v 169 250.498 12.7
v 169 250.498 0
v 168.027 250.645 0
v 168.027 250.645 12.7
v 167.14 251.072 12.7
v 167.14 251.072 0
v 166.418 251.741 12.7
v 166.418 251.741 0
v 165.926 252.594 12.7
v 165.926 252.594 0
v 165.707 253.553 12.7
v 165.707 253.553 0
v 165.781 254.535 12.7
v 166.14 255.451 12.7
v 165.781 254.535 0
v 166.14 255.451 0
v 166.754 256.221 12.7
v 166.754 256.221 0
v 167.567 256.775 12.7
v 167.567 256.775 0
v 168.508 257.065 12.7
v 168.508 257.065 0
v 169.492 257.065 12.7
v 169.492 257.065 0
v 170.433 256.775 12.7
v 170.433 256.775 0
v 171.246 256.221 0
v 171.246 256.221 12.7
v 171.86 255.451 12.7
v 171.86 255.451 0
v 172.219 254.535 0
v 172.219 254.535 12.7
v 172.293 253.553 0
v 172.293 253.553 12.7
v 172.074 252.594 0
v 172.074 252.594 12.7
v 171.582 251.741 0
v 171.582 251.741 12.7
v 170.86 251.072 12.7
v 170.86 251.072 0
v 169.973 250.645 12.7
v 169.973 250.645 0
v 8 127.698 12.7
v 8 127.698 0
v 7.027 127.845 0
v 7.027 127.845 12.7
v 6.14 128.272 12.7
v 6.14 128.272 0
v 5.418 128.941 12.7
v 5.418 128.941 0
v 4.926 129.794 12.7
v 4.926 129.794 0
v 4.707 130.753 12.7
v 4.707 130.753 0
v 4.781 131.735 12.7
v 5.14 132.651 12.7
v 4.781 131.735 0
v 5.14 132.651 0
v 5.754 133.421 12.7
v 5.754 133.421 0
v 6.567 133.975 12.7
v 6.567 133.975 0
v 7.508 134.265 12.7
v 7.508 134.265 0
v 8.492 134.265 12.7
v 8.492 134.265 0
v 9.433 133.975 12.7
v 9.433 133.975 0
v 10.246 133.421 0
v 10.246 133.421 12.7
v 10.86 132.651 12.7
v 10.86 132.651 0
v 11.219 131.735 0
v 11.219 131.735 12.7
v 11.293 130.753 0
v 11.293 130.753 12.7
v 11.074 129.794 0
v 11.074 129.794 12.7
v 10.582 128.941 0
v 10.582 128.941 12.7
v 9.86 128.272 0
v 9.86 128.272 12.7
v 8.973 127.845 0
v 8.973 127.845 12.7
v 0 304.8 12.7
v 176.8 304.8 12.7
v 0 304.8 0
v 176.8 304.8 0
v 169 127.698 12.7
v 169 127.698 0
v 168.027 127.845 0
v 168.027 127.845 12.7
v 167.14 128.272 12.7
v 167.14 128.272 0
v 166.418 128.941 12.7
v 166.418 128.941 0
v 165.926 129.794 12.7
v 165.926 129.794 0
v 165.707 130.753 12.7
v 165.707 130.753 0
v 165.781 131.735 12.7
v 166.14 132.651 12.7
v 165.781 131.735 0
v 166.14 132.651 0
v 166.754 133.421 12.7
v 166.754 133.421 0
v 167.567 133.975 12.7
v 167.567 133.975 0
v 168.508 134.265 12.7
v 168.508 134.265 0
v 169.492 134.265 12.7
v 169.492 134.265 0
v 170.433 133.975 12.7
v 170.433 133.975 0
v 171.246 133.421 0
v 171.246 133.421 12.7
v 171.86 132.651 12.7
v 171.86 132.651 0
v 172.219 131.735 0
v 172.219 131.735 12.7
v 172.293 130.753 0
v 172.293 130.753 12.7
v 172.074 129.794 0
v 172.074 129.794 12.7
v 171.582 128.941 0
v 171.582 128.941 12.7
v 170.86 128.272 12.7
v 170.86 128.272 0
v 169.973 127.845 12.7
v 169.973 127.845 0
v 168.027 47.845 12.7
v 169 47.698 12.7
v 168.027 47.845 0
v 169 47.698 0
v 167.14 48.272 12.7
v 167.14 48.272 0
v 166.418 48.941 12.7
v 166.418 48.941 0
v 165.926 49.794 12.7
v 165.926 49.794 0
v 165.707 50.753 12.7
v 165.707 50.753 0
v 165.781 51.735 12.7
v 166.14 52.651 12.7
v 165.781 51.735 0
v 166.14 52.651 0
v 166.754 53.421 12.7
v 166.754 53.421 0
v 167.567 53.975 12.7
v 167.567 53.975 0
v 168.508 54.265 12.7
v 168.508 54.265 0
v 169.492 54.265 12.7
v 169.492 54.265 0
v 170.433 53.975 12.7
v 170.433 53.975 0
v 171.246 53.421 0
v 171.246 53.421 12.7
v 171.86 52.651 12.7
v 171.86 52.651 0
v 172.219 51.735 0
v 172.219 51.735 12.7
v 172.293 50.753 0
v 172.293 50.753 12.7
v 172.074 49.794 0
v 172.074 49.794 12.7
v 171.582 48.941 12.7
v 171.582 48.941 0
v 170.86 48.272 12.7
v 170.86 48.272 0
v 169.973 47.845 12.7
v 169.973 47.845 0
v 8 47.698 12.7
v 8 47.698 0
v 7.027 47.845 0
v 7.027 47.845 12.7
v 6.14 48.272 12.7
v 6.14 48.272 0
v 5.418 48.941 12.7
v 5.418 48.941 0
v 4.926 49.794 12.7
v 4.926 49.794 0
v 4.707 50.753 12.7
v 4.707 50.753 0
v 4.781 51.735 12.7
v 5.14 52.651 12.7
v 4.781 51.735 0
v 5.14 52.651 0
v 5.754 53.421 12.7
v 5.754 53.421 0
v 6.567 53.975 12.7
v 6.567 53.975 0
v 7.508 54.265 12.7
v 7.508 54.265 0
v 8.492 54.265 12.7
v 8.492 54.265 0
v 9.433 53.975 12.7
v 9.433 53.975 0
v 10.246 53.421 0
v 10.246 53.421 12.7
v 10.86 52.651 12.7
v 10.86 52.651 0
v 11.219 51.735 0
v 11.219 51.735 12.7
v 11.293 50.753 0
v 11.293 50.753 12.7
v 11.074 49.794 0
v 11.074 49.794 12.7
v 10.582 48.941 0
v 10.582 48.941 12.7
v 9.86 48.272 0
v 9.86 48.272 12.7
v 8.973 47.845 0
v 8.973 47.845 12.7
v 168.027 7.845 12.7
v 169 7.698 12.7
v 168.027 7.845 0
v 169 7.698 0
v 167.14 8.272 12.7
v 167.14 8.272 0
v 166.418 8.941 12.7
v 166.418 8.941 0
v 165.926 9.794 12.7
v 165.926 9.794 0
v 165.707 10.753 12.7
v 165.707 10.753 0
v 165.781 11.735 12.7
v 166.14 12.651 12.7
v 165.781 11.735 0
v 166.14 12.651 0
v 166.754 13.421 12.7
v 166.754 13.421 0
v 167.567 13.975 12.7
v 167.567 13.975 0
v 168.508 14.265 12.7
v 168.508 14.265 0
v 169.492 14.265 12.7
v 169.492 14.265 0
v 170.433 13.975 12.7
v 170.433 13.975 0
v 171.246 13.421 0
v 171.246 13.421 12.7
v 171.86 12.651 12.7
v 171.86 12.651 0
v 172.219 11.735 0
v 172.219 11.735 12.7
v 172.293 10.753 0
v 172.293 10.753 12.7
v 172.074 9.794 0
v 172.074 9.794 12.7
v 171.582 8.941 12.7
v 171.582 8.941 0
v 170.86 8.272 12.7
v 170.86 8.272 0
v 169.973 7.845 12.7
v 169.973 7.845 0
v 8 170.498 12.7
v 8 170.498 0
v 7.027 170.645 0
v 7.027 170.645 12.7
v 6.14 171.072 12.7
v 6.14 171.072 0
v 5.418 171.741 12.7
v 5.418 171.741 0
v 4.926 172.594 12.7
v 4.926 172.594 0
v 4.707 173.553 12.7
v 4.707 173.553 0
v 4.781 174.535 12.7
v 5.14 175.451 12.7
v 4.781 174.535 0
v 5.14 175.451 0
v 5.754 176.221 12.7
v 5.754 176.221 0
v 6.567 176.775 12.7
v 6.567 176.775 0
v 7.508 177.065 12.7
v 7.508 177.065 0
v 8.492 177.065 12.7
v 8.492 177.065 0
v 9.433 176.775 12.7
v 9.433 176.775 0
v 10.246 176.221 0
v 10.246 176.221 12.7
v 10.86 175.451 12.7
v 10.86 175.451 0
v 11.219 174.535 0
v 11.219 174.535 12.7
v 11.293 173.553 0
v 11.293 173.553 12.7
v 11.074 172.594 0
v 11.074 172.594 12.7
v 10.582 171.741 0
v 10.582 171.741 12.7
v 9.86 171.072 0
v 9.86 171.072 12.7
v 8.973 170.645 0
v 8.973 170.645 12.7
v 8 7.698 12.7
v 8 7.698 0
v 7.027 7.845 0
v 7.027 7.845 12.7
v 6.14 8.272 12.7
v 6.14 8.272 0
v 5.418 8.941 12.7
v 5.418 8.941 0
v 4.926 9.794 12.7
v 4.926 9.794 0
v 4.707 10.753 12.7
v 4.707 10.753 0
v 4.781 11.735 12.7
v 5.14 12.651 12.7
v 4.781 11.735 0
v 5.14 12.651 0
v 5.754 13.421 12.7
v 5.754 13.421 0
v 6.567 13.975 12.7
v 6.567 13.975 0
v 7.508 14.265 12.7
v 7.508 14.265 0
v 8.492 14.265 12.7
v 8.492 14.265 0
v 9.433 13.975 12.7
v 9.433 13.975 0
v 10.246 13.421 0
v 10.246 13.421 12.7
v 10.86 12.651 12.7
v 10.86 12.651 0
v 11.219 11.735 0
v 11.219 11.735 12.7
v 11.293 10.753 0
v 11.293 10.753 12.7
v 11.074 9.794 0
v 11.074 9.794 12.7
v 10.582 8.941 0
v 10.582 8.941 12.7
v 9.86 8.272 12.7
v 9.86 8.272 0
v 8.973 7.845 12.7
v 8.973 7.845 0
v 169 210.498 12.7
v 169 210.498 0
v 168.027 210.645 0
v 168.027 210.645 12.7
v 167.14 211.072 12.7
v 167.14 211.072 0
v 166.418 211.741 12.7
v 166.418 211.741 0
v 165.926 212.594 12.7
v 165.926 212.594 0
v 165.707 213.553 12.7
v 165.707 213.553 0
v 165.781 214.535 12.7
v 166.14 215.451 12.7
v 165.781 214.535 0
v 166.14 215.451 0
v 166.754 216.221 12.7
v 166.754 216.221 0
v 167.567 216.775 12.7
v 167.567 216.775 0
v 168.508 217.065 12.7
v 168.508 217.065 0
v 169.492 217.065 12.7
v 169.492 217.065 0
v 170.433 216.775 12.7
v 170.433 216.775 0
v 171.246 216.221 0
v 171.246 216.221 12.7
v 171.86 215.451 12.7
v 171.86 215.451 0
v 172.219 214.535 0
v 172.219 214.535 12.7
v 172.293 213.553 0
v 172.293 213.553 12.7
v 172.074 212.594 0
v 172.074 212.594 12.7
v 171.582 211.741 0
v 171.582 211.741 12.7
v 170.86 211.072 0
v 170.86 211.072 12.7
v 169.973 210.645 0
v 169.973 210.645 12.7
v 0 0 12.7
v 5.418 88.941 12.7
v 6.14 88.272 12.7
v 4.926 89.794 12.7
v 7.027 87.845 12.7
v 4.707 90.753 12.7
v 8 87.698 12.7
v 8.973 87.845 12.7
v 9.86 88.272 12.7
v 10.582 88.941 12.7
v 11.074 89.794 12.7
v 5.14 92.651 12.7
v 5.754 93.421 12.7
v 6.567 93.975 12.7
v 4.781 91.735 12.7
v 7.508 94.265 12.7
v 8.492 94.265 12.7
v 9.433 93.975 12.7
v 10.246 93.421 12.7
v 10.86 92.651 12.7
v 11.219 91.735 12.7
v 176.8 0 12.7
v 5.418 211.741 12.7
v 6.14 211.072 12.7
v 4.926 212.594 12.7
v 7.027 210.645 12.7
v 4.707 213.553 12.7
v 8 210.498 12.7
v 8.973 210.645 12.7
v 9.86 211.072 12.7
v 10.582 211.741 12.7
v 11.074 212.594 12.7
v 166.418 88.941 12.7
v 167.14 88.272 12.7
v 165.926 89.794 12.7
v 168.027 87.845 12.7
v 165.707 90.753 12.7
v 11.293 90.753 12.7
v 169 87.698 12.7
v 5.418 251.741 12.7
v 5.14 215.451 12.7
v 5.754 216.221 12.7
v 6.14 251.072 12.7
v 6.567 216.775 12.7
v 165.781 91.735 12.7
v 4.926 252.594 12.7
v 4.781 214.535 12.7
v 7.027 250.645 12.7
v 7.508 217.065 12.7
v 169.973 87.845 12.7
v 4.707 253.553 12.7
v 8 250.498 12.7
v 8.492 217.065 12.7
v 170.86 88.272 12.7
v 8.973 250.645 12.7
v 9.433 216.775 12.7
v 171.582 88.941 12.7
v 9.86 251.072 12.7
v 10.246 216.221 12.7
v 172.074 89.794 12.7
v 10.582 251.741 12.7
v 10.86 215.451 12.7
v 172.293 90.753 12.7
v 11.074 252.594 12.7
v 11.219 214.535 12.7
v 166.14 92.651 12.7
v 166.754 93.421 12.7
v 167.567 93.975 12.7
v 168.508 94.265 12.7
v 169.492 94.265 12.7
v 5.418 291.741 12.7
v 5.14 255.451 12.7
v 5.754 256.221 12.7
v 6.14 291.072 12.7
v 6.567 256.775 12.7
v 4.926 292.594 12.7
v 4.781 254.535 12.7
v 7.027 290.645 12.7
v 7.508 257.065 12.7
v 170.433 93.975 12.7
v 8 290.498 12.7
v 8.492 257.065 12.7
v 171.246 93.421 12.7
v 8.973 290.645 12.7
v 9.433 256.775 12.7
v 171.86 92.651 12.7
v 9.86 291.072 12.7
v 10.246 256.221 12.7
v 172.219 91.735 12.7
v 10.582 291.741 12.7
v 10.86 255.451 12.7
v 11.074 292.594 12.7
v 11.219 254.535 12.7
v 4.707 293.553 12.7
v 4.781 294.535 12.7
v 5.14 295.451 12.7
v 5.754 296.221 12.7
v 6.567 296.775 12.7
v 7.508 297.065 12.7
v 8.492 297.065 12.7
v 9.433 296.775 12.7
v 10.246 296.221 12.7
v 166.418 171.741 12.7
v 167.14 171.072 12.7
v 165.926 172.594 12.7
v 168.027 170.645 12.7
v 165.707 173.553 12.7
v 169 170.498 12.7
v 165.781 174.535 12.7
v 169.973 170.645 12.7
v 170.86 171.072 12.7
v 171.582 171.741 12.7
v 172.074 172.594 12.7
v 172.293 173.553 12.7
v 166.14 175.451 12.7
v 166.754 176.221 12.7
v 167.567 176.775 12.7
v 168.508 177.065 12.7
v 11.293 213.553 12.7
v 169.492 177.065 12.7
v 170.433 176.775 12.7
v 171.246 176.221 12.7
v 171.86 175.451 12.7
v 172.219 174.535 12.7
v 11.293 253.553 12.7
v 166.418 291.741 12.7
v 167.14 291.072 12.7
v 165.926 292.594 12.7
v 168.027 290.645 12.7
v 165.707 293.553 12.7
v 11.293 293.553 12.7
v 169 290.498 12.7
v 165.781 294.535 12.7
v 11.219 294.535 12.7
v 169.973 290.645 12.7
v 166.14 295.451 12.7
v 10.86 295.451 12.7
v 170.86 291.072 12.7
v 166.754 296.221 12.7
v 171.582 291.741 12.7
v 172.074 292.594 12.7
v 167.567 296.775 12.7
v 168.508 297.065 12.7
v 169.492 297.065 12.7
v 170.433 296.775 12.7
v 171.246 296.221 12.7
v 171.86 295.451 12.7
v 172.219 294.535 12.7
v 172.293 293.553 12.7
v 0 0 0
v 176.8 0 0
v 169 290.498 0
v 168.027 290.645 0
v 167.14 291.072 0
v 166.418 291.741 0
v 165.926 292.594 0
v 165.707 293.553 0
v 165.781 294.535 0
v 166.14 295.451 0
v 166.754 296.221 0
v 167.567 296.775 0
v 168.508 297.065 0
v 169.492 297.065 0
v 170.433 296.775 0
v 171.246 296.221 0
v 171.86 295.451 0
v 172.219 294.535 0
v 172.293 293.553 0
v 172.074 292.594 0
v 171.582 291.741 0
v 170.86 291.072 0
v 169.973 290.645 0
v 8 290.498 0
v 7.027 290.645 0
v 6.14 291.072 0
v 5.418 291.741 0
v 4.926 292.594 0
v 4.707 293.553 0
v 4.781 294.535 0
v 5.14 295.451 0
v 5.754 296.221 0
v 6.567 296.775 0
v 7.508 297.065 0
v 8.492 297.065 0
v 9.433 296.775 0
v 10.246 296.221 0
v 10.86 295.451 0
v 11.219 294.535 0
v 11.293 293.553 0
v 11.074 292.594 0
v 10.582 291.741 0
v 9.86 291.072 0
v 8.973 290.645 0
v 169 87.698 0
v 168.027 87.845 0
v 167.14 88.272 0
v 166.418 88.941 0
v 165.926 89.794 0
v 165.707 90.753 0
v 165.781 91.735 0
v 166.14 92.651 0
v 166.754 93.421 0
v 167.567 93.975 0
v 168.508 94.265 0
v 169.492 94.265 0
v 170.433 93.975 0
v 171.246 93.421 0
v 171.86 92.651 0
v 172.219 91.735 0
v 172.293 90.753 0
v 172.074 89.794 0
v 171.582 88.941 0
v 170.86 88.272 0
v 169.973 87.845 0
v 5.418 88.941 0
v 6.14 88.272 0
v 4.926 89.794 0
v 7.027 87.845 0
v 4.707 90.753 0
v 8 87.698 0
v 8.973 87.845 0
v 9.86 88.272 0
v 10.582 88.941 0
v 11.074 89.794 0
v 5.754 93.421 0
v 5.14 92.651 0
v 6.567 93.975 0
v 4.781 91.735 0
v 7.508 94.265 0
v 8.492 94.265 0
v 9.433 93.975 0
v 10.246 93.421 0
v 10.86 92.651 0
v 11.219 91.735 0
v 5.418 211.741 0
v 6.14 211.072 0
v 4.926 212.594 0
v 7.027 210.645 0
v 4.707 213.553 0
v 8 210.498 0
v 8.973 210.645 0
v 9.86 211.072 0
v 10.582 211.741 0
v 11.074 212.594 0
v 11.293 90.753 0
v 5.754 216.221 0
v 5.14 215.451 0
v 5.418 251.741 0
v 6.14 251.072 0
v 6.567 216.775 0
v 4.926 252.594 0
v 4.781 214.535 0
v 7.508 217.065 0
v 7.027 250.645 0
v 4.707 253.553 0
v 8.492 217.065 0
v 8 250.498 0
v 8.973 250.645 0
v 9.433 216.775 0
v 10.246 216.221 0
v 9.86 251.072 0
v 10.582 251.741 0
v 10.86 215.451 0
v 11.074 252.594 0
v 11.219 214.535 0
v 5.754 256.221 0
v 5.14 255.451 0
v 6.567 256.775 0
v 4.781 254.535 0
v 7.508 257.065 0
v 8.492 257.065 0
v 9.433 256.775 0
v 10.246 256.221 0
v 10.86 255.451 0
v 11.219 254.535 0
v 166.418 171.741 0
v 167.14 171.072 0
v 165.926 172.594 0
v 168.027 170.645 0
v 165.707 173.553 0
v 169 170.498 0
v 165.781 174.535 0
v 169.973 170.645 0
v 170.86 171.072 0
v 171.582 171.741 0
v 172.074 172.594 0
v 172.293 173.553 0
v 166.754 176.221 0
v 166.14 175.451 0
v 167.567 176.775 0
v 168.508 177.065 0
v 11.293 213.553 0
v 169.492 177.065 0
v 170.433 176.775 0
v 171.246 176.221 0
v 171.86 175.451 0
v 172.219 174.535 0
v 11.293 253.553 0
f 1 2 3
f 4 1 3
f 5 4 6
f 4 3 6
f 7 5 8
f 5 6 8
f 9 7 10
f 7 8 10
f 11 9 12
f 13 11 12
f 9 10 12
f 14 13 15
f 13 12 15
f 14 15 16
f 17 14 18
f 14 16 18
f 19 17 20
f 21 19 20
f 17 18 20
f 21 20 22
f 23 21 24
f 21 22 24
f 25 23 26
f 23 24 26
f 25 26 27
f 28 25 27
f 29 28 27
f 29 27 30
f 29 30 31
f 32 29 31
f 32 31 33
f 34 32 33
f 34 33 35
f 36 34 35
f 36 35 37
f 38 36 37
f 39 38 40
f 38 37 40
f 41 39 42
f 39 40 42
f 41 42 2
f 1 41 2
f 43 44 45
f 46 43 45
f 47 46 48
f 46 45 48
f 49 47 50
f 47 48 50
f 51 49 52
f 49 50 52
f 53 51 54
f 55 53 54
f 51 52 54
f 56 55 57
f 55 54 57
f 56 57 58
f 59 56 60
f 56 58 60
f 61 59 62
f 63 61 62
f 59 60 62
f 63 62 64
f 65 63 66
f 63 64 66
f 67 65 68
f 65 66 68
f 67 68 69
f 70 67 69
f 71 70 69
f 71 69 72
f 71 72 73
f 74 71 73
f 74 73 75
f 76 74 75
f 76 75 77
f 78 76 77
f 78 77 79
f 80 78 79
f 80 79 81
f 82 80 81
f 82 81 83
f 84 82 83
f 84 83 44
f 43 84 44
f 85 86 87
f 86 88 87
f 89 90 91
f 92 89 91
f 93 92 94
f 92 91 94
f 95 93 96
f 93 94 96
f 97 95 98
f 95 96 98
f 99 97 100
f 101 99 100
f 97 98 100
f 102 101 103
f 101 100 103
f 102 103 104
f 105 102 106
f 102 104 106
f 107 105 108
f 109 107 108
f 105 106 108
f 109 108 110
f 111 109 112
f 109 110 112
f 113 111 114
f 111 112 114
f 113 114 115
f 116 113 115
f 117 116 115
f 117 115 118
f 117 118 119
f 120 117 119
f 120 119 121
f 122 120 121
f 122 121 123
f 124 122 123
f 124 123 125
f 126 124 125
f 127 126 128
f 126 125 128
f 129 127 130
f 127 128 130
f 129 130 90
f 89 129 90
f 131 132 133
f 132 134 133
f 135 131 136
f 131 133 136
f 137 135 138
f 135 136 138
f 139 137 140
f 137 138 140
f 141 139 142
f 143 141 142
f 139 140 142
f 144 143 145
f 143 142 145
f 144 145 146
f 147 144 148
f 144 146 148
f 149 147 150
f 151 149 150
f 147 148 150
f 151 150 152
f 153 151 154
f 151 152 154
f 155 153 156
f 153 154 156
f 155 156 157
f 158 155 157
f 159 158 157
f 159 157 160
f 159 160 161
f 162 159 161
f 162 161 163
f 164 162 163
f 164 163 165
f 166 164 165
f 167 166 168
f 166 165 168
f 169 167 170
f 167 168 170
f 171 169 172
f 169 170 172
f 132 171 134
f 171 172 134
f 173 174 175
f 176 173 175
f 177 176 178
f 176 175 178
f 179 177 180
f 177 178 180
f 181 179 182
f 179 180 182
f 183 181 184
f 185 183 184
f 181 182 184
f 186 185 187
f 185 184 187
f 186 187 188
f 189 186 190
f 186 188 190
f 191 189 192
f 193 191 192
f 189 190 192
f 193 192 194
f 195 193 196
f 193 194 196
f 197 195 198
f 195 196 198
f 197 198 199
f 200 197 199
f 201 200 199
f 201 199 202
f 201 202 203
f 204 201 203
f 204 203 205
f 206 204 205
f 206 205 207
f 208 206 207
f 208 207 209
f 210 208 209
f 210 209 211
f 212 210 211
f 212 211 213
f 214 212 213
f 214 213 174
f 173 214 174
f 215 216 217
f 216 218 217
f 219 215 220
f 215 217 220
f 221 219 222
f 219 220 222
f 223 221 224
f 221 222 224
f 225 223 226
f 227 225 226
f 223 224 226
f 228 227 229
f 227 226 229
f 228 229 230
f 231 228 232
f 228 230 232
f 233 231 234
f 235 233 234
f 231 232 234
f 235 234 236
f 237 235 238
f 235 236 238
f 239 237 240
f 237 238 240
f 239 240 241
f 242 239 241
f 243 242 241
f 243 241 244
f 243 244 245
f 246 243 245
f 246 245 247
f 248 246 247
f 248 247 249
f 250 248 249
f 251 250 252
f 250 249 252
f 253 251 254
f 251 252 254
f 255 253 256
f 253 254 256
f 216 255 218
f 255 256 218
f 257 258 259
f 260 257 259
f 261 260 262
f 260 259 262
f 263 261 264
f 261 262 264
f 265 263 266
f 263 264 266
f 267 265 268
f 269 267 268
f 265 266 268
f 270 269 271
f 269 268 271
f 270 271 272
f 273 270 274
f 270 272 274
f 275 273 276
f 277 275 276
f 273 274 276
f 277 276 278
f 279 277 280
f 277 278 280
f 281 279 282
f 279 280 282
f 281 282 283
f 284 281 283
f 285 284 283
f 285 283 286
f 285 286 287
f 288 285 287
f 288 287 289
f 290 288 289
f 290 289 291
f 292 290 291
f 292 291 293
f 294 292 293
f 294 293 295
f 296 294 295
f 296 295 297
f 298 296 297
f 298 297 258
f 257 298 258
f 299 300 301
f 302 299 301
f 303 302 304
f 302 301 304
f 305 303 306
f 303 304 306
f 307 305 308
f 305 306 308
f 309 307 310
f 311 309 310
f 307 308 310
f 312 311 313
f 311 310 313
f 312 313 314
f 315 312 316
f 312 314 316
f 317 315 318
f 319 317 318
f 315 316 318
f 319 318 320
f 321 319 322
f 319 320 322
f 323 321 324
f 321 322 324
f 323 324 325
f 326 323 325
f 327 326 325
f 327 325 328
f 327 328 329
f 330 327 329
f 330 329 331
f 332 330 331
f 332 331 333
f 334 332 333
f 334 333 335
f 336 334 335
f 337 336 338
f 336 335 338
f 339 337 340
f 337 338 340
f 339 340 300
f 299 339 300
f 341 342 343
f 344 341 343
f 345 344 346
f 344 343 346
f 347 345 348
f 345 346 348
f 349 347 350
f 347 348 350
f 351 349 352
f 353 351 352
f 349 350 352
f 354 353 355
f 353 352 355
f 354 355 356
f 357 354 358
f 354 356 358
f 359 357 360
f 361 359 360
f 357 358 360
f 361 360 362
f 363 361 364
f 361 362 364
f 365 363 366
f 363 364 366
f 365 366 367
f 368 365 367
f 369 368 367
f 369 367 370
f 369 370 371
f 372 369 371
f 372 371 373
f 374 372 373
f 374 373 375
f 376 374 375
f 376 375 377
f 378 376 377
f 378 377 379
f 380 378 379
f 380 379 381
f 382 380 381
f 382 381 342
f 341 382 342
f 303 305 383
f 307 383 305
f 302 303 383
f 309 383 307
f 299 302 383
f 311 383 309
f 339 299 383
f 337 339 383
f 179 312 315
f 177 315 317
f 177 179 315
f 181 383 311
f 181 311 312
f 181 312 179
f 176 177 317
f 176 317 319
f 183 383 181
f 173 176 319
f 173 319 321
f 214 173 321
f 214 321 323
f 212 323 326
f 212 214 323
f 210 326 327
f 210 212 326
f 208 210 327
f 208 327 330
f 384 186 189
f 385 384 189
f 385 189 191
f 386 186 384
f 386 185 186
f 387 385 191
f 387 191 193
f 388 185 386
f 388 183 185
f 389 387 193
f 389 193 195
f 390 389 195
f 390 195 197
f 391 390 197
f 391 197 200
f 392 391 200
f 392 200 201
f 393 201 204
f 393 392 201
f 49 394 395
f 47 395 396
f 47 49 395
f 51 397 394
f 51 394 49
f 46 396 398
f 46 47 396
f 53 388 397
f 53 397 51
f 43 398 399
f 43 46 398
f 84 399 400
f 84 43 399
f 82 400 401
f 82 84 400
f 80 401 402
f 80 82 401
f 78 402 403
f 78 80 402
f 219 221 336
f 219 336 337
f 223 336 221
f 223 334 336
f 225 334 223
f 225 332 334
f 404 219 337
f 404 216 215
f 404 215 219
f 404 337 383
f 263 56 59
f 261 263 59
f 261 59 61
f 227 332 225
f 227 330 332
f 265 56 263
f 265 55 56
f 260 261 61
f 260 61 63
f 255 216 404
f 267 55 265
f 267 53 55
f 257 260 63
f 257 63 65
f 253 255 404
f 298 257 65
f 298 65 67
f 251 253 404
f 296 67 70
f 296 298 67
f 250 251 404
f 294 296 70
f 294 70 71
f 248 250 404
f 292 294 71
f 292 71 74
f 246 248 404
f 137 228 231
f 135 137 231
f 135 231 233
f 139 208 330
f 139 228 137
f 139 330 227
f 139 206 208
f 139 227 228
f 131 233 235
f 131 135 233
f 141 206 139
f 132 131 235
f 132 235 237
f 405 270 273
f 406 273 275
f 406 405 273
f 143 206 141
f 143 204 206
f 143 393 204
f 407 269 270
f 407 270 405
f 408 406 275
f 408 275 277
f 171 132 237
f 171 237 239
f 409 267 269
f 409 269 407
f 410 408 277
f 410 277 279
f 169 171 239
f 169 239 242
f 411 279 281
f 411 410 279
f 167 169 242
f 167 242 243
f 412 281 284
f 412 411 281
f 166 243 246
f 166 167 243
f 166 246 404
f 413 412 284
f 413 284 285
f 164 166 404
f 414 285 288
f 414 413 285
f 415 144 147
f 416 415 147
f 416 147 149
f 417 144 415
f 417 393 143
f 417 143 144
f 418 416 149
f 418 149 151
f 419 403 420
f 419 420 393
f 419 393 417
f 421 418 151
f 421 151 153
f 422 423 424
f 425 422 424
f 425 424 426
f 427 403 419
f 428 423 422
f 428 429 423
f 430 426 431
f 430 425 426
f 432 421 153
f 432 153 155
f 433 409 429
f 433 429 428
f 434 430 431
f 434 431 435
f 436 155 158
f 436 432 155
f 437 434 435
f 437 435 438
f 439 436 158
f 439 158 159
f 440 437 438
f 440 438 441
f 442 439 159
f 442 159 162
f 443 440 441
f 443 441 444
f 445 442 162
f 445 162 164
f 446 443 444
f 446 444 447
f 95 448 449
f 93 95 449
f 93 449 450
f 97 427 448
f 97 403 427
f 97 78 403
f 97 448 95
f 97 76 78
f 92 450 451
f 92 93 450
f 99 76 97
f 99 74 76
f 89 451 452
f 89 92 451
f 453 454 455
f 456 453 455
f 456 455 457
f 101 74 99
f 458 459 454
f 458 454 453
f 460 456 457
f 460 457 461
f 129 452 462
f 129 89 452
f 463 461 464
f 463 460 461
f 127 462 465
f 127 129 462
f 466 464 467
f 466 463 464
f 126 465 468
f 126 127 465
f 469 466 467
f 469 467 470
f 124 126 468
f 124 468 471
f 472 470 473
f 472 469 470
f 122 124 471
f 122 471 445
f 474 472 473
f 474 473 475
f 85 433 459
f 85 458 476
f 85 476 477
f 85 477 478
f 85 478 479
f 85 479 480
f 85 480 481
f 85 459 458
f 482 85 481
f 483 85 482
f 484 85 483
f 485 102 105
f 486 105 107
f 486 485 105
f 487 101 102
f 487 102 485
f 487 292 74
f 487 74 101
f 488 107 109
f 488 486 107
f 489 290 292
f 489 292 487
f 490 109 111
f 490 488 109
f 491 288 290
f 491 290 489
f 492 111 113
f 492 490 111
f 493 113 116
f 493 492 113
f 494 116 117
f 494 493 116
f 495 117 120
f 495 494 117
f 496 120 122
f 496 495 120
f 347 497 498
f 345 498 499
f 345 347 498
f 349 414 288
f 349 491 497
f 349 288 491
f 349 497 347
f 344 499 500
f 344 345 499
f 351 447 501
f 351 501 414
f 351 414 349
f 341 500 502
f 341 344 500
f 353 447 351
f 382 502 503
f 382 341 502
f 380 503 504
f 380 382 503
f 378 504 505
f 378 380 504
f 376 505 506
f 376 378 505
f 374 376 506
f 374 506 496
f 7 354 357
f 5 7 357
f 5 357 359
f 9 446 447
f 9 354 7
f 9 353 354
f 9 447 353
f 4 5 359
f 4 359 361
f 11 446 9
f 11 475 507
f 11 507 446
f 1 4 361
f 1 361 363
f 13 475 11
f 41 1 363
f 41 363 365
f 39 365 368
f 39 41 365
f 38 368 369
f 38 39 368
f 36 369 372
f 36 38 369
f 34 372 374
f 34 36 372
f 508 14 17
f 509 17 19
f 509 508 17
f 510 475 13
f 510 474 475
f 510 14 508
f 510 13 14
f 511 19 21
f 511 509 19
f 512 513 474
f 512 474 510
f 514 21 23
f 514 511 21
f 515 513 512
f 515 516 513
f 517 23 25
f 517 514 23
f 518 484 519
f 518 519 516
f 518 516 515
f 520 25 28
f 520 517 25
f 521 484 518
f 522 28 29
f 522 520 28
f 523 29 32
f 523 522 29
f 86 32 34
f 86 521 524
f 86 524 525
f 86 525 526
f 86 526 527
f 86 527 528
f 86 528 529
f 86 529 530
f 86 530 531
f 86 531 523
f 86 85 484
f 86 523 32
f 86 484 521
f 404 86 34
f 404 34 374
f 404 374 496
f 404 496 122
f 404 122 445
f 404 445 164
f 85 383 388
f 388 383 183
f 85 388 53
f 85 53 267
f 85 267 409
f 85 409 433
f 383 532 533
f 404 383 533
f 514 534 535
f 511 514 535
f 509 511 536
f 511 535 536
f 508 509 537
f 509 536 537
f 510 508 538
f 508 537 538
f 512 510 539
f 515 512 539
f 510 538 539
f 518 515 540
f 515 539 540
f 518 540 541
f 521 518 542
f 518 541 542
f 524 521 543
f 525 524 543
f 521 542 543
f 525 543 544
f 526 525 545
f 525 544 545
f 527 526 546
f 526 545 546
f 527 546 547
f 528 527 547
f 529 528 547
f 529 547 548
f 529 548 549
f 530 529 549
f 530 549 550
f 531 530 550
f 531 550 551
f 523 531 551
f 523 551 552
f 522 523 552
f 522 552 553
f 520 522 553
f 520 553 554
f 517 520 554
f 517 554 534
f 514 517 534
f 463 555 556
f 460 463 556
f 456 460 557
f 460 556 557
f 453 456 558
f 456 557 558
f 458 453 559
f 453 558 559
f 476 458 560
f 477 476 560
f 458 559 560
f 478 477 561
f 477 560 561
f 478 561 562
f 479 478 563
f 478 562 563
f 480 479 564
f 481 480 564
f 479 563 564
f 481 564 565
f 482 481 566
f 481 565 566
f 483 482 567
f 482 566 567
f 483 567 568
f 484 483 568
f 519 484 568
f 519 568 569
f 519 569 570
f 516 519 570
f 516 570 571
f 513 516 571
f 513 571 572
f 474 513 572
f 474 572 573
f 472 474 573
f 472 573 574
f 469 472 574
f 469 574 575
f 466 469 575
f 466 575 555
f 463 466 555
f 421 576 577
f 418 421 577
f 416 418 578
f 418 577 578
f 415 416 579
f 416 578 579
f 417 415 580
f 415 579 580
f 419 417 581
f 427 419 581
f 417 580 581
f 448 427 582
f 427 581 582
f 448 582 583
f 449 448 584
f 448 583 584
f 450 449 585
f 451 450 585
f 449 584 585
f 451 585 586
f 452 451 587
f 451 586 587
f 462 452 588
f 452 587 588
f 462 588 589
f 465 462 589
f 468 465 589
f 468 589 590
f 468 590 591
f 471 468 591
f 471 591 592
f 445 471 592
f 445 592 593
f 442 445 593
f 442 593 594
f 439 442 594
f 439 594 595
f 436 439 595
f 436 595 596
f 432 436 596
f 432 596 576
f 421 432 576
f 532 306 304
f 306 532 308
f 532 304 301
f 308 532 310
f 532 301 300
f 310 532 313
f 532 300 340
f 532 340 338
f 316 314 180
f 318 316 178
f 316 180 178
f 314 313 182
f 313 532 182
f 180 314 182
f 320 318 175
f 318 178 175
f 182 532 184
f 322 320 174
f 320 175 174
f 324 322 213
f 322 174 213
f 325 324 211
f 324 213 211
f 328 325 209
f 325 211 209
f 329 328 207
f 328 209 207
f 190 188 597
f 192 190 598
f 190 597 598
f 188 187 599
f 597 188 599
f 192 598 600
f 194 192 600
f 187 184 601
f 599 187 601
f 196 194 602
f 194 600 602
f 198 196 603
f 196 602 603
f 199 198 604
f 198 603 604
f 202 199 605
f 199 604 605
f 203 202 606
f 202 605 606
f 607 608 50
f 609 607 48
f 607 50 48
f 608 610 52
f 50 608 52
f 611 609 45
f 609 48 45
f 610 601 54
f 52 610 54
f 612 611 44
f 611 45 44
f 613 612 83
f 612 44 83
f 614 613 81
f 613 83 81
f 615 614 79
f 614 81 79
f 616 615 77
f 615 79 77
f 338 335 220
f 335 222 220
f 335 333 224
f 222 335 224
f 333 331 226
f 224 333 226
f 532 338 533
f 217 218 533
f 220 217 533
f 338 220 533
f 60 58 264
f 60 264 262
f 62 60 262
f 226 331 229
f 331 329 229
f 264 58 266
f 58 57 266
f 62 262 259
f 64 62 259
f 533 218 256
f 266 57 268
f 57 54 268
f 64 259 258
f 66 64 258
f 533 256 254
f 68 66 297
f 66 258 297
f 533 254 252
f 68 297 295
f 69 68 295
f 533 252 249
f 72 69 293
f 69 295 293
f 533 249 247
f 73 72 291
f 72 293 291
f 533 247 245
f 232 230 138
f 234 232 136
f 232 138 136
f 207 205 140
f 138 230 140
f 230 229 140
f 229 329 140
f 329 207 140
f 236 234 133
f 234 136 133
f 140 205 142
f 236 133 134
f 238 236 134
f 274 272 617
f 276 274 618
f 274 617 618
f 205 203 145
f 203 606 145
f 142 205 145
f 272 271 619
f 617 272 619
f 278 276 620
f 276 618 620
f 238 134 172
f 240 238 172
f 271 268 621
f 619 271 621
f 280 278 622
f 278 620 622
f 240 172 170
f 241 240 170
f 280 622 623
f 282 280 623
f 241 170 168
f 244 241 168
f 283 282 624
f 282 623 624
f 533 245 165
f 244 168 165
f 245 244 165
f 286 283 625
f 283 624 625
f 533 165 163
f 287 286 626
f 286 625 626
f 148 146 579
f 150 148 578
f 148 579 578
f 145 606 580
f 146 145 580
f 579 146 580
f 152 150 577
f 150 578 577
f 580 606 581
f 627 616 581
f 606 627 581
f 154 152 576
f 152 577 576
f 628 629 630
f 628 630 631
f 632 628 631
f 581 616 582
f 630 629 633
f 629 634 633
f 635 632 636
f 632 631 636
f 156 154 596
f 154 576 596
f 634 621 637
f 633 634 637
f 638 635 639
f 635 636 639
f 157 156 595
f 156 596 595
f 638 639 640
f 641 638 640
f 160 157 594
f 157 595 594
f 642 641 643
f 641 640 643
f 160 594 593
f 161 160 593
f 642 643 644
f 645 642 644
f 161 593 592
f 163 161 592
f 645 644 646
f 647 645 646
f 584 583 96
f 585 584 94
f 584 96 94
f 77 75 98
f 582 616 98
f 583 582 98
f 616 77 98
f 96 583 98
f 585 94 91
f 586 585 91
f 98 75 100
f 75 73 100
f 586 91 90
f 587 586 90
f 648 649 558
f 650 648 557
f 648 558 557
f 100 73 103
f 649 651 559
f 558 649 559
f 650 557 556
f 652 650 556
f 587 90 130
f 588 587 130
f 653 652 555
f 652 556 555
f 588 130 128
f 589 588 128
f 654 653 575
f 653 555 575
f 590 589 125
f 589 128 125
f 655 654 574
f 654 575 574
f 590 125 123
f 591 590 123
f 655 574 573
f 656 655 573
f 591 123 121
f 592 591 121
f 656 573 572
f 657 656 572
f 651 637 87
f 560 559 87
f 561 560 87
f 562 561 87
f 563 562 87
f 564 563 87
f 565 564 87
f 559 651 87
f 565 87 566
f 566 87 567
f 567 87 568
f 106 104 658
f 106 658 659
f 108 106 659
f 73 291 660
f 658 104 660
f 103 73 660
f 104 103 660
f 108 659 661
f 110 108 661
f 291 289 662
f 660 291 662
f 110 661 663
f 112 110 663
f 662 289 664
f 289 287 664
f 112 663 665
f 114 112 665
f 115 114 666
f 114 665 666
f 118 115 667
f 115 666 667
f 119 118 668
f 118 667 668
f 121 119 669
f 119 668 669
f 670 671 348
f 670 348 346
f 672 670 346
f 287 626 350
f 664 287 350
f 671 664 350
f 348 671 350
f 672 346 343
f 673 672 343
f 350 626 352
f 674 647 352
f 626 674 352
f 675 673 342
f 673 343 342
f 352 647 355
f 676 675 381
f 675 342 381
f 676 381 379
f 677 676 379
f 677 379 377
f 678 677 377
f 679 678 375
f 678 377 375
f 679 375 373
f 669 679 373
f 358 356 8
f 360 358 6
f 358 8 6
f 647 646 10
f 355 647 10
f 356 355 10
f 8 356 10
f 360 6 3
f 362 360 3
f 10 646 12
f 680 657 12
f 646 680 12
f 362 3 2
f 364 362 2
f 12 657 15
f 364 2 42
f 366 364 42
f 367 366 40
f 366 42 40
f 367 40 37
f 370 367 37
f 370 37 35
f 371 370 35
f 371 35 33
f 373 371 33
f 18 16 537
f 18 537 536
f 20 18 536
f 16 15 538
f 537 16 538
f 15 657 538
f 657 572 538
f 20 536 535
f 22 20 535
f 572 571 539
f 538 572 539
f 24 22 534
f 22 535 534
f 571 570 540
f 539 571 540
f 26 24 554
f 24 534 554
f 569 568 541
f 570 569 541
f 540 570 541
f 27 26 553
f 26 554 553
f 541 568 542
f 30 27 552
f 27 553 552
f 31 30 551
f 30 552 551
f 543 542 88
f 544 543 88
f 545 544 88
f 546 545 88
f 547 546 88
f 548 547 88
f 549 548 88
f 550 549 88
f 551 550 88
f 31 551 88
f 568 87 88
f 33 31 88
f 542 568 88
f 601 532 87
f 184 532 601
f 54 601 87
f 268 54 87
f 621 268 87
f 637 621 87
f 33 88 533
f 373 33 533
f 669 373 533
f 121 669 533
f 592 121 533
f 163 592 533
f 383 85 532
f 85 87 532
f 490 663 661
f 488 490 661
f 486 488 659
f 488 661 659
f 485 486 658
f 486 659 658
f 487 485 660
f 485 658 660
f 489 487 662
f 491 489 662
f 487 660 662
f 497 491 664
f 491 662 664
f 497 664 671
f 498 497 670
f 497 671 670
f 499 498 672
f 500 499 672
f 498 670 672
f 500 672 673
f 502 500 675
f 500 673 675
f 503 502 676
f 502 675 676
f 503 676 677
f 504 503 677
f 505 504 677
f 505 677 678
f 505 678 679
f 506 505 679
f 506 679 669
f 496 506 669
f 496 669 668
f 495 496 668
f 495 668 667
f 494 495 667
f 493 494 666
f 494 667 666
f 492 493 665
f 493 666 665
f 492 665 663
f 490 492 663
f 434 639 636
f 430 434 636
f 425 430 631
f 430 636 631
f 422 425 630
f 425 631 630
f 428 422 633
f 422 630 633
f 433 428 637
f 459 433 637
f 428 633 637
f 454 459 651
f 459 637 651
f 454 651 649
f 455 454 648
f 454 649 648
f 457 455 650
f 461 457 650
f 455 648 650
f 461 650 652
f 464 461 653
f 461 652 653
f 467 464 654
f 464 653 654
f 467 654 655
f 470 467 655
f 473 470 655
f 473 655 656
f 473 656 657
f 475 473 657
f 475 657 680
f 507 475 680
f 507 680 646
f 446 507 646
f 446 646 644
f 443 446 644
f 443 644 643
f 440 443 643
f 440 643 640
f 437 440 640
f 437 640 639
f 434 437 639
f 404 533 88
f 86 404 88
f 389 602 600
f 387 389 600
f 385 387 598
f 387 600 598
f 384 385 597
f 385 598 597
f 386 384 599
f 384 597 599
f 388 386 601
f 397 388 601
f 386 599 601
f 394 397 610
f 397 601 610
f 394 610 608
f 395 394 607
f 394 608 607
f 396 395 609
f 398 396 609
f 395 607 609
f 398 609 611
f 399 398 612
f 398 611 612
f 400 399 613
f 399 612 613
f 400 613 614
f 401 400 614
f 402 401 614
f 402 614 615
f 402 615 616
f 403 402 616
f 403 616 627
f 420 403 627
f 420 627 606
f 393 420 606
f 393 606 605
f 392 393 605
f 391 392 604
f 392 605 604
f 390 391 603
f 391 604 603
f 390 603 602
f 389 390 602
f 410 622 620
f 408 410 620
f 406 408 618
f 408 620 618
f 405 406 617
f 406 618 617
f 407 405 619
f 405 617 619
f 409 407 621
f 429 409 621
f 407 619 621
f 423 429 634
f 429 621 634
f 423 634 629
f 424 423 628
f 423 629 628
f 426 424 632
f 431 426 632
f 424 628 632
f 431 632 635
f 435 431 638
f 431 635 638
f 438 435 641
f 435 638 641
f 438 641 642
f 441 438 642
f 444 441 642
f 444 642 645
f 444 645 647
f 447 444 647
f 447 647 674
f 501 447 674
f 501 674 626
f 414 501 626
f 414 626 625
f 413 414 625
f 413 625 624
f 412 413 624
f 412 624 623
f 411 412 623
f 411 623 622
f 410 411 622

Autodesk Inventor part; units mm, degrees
ref_plane "YZ Plane" through (0, 0, 0) normal (1, 0, 0) x (0, 1, 0)
ref_plane "XZ Plane" through (0, 0, 0) normal (0, 1, 0) x (-1, 0, 0)
ref_plane "XY Plane" through (0, 0, 0) normal (0, 0, 1) x (1, 0, 0)
sketch "Sketch1" plane through (0, 0, 0) normal (0, 0, 1) x (1, 0, 0)
  line L0 (0, 0) -> (176.8, 0)
  line L1 (176.8, 0) -> (176.8, 304.8)
  line L2 (176.8, 304.8) -> (0, 304.8)
  line L3 (0, 304.8) -> (0, 0)
  dimension "d1" = 176.8
  dimension "d2" = 304.8
extrude "Extrusion1" add sketch "Sketch1" along normal blind 12.7
sketch "Sketch2" plane through (0, 0, 12.7) normal (0, 0, 1) x (1, 0, 0)
  line L0 (0, 0) -> (176.8, 0) projected
  line L1 (0, 304.8) -> (0, 0) projected
  point P0 (8, 11)
  point P1 (8, 51)
  point P2 (8, 91)
  point P3 (8, 131)
  dimension "d5" = 40
  dimension "d6" = 40
  dimension "d7" = 40
  dimension "d8" = 11
  dimension "d9" = 8
hole "Hole1" at (8, 11, 12.7) at (8, 51, 12.7) at (8, 91, 12.7) at (8, 131, 12.7) direction (0, 0, -1) diameter 6.604 end through all clearance for "Socket Head Cap Screw" size "M6" standard "Ansi Metric M Profile"
pattern_linear "Rectangular Pattern1" count 2 spacing 162.8 along (0, 1, 0) count 2 spacing 161 along (1, 0, 0) of "Hole1"
properties part number "actuatorMount" material "Aluminum 6061"
